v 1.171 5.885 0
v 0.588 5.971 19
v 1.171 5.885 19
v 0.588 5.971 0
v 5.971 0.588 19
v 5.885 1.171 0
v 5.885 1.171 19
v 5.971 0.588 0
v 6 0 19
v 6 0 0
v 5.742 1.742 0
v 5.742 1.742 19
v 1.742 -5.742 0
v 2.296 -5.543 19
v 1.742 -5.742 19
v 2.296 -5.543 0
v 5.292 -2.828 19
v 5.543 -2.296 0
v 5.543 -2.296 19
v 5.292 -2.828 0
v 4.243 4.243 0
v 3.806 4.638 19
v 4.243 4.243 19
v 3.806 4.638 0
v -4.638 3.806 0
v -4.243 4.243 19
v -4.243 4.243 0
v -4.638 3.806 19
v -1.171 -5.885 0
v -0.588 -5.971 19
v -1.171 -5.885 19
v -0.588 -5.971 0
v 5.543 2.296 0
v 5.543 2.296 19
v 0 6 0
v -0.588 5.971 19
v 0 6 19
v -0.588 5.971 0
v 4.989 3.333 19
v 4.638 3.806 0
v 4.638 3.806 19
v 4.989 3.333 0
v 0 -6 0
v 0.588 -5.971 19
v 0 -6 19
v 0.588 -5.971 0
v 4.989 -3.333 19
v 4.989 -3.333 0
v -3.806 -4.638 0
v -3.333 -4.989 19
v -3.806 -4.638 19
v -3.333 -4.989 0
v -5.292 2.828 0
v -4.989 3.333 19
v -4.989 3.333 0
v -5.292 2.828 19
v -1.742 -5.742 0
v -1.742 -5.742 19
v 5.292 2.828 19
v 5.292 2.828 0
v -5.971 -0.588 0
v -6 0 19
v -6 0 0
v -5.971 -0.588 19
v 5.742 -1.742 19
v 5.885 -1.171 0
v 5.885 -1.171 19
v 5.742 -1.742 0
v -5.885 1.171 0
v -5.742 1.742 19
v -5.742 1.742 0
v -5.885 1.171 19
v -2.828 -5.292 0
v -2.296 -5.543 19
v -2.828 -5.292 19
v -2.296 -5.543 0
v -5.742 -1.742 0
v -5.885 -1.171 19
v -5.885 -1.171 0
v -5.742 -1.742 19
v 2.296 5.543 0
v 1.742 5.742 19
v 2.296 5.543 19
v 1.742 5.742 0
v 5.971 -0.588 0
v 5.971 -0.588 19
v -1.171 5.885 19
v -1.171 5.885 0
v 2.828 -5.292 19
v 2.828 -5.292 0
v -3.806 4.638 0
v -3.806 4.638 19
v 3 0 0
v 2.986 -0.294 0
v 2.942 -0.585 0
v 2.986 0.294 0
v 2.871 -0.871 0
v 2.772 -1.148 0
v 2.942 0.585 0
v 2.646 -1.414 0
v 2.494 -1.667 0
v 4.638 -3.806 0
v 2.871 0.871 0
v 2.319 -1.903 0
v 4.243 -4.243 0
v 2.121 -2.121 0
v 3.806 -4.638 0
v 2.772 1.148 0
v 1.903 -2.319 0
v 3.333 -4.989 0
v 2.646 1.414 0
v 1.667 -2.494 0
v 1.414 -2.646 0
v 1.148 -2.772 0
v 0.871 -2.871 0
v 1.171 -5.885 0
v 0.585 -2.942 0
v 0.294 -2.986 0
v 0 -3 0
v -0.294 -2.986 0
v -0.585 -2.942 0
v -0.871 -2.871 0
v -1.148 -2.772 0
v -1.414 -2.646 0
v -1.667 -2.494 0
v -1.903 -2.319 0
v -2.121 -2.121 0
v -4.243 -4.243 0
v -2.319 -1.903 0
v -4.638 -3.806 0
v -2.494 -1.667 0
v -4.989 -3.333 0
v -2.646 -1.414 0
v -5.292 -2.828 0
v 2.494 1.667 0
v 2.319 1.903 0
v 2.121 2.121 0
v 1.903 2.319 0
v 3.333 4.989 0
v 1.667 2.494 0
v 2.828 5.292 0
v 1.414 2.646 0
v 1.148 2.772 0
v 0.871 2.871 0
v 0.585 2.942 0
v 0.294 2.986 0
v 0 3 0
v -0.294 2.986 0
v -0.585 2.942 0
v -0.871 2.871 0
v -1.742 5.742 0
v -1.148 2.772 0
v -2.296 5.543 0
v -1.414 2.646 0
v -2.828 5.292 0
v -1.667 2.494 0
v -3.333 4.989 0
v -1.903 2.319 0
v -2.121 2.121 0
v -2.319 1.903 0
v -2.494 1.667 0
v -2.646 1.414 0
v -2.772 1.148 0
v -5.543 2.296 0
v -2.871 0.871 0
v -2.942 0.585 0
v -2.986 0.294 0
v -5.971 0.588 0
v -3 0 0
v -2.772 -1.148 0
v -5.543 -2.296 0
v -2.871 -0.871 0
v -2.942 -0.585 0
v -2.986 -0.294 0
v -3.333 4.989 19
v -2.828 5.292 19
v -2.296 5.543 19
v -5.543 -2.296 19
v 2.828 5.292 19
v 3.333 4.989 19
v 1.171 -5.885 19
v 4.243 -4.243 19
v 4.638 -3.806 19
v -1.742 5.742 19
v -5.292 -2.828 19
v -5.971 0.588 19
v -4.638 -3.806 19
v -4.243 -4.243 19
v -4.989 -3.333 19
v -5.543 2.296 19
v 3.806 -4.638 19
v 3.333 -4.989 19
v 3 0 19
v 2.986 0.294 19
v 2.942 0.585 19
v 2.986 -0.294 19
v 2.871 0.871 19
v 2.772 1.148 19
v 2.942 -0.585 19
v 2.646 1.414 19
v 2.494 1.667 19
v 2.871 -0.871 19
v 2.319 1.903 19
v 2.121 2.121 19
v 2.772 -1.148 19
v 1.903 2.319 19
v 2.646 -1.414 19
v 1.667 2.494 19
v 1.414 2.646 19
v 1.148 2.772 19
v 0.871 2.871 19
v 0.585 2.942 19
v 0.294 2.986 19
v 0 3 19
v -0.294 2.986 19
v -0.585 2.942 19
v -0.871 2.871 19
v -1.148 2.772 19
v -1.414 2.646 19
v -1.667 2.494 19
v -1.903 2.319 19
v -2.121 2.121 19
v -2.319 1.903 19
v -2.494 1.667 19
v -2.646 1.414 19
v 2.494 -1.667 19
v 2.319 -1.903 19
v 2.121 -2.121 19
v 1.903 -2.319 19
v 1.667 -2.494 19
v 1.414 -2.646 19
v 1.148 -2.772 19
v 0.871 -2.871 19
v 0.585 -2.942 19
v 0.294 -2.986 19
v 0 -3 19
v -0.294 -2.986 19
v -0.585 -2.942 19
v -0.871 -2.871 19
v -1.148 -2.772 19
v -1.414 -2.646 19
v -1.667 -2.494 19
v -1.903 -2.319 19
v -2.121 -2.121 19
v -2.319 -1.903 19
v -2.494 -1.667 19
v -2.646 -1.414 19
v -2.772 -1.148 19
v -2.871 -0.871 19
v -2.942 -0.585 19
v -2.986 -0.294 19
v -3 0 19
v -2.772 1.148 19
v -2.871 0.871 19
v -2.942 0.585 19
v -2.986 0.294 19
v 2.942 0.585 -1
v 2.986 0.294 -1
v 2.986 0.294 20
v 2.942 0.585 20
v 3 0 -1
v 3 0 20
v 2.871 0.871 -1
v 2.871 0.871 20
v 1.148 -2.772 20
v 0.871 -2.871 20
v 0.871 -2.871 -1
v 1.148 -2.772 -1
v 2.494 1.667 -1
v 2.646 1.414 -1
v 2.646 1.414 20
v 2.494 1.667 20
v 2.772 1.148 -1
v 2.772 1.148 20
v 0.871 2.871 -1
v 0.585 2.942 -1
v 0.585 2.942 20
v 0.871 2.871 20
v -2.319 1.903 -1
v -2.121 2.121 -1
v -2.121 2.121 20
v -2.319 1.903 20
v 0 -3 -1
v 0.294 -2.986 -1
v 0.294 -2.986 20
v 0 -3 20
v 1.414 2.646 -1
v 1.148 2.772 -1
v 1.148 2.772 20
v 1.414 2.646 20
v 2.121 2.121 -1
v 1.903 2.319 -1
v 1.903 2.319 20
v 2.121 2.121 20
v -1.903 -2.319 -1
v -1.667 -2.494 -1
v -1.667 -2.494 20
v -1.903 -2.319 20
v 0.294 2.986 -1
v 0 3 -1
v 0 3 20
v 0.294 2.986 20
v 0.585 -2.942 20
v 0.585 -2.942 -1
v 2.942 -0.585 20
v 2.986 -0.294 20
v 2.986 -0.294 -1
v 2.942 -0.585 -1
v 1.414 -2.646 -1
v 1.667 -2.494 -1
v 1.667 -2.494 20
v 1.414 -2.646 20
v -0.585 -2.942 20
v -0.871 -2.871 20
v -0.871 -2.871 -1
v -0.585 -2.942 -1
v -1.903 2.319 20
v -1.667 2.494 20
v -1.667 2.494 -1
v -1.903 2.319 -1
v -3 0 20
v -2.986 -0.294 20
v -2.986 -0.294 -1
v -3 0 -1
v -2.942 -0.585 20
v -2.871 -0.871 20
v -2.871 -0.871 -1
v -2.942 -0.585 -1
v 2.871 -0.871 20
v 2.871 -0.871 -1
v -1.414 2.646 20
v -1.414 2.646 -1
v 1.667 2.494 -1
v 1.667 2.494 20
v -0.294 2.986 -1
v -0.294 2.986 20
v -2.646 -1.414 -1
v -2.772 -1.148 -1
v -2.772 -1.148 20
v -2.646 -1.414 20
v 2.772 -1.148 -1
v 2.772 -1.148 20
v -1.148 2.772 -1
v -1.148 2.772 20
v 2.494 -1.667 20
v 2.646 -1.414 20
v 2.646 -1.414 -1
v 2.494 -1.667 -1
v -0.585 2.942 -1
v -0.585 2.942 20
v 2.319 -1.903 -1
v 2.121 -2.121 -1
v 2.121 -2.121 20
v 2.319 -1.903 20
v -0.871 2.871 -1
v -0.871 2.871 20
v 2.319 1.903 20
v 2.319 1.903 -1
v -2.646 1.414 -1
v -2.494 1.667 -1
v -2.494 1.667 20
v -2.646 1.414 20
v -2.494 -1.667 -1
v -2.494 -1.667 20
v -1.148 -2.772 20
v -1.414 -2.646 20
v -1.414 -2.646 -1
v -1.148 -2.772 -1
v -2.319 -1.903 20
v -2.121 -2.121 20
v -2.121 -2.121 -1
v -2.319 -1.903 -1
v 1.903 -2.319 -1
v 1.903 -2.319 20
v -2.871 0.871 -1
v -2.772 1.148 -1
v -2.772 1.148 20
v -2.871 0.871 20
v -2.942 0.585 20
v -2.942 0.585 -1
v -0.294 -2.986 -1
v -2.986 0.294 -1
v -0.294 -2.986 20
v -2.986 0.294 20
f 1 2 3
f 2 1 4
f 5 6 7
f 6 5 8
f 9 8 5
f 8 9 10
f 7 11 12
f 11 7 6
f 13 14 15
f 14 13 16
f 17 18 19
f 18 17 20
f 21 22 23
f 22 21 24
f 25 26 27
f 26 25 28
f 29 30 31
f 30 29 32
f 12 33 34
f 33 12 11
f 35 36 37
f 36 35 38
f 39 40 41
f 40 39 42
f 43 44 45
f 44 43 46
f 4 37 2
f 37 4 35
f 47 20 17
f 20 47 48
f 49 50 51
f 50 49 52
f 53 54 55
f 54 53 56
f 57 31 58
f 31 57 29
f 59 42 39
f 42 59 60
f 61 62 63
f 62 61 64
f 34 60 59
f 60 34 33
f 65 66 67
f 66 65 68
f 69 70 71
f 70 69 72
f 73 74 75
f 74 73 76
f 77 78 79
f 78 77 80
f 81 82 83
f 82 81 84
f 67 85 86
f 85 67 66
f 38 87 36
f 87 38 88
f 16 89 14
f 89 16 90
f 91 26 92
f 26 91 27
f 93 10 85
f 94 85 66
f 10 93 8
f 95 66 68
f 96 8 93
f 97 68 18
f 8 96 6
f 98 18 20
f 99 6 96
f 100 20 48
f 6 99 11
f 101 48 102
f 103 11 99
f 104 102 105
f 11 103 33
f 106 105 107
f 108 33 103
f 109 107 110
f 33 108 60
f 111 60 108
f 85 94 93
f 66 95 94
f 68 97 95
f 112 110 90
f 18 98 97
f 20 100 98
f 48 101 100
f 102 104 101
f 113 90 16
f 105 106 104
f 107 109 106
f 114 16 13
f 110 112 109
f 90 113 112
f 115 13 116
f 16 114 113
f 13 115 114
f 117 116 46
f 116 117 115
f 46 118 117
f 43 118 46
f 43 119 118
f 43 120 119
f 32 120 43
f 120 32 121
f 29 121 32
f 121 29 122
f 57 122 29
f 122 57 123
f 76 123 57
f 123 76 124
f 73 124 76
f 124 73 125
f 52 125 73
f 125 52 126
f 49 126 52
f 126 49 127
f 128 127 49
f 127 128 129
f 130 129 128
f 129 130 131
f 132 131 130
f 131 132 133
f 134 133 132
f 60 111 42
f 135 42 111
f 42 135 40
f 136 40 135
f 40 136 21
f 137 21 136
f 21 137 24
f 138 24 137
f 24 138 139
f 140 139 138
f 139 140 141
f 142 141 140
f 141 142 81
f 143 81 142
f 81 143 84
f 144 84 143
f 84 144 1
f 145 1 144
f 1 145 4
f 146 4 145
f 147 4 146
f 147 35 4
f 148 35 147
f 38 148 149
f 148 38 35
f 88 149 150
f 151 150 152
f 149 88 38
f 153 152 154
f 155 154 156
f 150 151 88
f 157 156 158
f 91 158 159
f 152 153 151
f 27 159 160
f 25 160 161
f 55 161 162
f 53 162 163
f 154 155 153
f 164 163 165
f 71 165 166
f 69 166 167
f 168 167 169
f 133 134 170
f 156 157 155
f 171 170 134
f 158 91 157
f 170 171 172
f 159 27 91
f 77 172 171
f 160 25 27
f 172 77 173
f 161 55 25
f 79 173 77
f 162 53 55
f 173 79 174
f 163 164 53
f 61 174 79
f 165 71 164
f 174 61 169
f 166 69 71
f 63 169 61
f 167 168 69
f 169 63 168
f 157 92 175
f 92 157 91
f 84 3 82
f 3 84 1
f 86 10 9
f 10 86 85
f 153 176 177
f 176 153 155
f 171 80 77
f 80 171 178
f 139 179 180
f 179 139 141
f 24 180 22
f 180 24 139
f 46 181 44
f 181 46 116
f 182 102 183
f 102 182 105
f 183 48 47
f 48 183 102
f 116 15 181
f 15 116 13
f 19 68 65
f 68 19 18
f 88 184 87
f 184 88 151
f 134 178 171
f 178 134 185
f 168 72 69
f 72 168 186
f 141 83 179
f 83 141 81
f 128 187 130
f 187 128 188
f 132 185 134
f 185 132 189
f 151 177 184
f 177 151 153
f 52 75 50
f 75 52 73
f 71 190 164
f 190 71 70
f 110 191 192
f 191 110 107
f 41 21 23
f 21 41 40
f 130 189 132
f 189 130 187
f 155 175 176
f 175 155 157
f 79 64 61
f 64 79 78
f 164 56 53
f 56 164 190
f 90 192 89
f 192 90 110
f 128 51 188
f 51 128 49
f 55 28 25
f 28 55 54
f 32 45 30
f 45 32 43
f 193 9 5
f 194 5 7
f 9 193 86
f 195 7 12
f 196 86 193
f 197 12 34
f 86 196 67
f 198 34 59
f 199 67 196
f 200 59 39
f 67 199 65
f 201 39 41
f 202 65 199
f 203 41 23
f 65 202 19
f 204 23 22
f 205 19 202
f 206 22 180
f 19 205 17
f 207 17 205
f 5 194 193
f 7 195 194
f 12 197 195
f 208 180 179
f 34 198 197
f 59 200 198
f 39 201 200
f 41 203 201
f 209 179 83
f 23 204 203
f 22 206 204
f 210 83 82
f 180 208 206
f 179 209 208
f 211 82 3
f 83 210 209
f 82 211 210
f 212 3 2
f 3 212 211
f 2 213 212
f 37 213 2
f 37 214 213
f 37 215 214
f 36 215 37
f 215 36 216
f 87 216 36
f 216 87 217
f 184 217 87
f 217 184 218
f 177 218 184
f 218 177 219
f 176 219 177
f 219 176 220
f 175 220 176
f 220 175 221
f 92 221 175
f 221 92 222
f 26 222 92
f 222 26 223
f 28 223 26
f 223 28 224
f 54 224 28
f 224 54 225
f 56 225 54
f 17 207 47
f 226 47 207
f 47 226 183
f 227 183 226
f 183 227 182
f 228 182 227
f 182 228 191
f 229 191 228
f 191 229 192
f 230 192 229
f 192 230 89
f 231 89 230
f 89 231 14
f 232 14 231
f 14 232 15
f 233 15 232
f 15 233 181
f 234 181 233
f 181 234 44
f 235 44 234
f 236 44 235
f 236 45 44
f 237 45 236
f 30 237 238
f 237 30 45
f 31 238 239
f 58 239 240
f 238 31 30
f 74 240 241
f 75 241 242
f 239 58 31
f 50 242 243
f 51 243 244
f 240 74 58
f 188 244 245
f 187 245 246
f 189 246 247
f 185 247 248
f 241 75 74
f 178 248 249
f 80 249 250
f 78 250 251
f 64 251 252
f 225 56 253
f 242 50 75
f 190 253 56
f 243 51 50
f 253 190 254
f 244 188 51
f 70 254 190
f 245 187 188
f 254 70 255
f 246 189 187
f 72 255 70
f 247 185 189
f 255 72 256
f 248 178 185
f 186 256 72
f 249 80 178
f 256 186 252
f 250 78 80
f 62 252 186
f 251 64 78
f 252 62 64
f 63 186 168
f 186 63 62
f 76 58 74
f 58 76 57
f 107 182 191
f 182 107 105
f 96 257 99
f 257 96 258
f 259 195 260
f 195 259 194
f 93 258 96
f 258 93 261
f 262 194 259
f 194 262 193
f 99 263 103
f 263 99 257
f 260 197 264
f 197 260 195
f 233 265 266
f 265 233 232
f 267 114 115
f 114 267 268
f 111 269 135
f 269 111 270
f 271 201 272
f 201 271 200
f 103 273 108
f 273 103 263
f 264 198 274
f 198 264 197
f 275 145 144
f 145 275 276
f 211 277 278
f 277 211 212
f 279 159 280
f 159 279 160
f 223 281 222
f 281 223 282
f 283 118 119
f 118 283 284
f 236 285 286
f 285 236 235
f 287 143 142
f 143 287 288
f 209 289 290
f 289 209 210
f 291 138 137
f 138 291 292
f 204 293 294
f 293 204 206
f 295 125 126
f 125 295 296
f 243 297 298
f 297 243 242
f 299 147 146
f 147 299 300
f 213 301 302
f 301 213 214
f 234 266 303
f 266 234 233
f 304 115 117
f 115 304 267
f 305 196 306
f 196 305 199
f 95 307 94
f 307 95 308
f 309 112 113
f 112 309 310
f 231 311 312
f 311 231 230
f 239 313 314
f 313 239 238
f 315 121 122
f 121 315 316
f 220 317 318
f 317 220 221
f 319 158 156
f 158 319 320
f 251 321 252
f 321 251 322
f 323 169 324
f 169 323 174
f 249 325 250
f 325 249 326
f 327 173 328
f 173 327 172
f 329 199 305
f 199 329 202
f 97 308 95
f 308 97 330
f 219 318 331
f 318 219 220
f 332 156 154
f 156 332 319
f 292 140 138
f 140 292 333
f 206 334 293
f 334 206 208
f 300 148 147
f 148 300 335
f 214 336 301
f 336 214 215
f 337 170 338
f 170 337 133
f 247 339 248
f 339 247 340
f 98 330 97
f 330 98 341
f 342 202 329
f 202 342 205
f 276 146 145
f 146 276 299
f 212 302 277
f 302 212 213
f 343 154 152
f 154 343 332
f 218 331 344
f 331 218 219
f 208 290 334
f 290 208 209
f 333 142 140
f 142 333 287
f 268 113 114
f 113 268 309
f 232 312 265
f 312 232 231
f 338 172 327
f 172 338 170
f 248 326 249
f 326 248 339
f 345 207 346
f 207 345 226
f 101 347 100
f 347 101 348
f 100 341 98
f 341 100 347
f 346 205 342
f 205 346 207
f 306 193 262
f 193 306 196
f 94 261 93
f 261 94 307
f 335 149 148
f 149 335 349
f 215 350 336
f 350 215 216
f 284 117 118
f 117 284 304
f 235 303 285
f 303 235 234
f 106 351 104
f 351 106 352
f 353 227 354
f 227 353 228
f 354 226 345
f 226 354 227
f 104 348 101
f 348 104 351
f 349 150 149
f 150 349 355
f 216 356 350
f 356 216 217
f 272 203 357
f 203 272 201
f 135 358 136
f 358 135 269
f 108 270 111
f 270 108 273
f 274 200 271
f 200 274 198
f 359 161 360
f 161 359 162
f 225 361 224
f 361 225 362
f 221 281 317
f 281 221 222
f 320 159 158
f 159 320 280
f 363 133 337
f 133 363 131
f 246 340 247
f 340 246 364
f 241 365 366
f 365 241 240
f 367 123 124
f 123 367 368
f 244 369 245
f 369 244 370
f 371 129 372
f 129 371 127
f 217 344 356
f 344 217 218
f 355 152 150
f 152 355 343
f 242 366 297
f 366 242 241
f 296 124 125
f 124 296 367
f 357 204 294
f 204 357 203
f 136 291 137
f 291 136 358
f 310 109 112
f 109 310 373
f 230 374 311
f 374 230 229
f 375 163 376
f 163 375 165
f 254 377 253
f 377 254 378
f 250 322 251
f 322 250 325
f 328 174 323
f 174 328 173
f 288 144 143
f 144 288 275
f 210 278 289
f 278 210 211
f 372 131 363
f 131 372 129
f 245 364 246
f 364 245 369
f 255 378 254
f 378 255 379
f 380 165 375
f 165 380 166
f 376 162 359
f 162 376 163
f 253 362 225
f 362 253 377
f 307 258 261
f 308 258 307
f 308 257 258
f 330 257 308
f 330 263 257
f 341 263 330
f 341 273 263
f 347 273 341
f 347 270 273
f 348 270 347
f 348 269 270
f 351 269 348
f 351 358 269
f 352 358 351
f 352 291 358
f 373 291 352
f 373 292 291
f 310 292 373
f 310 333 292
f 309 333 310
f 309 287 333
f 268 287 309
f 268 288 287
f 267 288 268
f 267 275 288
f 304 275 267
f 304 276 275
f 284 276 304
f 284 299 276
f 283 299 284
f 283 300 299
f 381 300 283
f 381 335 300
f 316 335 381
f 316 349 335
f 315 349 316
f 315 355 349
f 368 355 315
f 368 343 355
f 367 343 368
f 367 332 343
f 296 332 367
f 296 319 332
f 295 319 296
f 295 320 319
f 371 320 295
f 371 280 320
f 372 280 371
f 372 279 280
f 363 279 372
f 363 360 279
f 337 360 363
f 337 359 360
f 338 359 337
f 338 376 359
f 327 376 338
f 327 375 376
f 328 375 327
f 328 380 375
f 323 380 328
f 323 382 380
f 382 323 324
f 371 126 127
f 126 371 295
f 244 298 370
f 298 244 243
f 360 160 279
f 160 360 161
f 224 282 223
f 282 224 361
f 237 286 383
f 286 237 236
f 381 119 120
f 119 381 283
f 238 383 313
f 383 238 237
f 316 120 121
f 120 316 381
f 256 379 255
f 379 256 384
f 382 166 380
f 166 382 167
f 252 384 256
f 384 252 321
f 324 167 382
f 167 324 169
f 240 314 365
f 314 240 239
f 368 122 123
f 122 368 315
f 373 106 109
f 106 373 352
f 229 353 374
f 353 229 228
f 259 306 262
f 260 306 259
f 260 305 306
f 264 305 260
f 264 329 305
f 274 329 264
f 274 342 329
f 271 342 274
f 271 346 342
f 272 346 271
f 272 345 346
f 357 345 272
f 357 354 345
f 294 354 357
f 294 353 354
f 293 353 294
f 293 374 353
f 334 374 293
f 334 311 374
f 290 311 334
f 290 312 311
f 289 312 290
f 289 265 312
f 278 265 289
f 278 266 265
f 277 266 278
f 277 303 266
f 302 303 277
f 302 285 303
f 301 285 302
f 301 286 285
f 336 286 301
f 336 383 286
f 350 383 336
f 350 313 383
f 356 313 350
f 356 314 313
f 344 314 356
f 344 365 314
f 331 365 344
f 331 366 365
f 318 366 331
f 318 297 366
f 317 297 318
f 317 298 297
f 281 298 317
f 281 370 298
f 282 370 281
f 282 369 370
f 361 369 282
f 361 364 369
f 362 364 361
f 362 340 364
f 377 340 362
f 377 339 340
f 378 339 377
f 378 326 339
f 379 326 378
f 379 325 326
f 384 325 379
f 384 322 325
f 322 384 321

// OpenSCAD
cylinder(h=19.0, d=12.0, $fn=64);
translate([0, 0, -1])
cylinder(h=21.0, d=6.0, $fn=64);
